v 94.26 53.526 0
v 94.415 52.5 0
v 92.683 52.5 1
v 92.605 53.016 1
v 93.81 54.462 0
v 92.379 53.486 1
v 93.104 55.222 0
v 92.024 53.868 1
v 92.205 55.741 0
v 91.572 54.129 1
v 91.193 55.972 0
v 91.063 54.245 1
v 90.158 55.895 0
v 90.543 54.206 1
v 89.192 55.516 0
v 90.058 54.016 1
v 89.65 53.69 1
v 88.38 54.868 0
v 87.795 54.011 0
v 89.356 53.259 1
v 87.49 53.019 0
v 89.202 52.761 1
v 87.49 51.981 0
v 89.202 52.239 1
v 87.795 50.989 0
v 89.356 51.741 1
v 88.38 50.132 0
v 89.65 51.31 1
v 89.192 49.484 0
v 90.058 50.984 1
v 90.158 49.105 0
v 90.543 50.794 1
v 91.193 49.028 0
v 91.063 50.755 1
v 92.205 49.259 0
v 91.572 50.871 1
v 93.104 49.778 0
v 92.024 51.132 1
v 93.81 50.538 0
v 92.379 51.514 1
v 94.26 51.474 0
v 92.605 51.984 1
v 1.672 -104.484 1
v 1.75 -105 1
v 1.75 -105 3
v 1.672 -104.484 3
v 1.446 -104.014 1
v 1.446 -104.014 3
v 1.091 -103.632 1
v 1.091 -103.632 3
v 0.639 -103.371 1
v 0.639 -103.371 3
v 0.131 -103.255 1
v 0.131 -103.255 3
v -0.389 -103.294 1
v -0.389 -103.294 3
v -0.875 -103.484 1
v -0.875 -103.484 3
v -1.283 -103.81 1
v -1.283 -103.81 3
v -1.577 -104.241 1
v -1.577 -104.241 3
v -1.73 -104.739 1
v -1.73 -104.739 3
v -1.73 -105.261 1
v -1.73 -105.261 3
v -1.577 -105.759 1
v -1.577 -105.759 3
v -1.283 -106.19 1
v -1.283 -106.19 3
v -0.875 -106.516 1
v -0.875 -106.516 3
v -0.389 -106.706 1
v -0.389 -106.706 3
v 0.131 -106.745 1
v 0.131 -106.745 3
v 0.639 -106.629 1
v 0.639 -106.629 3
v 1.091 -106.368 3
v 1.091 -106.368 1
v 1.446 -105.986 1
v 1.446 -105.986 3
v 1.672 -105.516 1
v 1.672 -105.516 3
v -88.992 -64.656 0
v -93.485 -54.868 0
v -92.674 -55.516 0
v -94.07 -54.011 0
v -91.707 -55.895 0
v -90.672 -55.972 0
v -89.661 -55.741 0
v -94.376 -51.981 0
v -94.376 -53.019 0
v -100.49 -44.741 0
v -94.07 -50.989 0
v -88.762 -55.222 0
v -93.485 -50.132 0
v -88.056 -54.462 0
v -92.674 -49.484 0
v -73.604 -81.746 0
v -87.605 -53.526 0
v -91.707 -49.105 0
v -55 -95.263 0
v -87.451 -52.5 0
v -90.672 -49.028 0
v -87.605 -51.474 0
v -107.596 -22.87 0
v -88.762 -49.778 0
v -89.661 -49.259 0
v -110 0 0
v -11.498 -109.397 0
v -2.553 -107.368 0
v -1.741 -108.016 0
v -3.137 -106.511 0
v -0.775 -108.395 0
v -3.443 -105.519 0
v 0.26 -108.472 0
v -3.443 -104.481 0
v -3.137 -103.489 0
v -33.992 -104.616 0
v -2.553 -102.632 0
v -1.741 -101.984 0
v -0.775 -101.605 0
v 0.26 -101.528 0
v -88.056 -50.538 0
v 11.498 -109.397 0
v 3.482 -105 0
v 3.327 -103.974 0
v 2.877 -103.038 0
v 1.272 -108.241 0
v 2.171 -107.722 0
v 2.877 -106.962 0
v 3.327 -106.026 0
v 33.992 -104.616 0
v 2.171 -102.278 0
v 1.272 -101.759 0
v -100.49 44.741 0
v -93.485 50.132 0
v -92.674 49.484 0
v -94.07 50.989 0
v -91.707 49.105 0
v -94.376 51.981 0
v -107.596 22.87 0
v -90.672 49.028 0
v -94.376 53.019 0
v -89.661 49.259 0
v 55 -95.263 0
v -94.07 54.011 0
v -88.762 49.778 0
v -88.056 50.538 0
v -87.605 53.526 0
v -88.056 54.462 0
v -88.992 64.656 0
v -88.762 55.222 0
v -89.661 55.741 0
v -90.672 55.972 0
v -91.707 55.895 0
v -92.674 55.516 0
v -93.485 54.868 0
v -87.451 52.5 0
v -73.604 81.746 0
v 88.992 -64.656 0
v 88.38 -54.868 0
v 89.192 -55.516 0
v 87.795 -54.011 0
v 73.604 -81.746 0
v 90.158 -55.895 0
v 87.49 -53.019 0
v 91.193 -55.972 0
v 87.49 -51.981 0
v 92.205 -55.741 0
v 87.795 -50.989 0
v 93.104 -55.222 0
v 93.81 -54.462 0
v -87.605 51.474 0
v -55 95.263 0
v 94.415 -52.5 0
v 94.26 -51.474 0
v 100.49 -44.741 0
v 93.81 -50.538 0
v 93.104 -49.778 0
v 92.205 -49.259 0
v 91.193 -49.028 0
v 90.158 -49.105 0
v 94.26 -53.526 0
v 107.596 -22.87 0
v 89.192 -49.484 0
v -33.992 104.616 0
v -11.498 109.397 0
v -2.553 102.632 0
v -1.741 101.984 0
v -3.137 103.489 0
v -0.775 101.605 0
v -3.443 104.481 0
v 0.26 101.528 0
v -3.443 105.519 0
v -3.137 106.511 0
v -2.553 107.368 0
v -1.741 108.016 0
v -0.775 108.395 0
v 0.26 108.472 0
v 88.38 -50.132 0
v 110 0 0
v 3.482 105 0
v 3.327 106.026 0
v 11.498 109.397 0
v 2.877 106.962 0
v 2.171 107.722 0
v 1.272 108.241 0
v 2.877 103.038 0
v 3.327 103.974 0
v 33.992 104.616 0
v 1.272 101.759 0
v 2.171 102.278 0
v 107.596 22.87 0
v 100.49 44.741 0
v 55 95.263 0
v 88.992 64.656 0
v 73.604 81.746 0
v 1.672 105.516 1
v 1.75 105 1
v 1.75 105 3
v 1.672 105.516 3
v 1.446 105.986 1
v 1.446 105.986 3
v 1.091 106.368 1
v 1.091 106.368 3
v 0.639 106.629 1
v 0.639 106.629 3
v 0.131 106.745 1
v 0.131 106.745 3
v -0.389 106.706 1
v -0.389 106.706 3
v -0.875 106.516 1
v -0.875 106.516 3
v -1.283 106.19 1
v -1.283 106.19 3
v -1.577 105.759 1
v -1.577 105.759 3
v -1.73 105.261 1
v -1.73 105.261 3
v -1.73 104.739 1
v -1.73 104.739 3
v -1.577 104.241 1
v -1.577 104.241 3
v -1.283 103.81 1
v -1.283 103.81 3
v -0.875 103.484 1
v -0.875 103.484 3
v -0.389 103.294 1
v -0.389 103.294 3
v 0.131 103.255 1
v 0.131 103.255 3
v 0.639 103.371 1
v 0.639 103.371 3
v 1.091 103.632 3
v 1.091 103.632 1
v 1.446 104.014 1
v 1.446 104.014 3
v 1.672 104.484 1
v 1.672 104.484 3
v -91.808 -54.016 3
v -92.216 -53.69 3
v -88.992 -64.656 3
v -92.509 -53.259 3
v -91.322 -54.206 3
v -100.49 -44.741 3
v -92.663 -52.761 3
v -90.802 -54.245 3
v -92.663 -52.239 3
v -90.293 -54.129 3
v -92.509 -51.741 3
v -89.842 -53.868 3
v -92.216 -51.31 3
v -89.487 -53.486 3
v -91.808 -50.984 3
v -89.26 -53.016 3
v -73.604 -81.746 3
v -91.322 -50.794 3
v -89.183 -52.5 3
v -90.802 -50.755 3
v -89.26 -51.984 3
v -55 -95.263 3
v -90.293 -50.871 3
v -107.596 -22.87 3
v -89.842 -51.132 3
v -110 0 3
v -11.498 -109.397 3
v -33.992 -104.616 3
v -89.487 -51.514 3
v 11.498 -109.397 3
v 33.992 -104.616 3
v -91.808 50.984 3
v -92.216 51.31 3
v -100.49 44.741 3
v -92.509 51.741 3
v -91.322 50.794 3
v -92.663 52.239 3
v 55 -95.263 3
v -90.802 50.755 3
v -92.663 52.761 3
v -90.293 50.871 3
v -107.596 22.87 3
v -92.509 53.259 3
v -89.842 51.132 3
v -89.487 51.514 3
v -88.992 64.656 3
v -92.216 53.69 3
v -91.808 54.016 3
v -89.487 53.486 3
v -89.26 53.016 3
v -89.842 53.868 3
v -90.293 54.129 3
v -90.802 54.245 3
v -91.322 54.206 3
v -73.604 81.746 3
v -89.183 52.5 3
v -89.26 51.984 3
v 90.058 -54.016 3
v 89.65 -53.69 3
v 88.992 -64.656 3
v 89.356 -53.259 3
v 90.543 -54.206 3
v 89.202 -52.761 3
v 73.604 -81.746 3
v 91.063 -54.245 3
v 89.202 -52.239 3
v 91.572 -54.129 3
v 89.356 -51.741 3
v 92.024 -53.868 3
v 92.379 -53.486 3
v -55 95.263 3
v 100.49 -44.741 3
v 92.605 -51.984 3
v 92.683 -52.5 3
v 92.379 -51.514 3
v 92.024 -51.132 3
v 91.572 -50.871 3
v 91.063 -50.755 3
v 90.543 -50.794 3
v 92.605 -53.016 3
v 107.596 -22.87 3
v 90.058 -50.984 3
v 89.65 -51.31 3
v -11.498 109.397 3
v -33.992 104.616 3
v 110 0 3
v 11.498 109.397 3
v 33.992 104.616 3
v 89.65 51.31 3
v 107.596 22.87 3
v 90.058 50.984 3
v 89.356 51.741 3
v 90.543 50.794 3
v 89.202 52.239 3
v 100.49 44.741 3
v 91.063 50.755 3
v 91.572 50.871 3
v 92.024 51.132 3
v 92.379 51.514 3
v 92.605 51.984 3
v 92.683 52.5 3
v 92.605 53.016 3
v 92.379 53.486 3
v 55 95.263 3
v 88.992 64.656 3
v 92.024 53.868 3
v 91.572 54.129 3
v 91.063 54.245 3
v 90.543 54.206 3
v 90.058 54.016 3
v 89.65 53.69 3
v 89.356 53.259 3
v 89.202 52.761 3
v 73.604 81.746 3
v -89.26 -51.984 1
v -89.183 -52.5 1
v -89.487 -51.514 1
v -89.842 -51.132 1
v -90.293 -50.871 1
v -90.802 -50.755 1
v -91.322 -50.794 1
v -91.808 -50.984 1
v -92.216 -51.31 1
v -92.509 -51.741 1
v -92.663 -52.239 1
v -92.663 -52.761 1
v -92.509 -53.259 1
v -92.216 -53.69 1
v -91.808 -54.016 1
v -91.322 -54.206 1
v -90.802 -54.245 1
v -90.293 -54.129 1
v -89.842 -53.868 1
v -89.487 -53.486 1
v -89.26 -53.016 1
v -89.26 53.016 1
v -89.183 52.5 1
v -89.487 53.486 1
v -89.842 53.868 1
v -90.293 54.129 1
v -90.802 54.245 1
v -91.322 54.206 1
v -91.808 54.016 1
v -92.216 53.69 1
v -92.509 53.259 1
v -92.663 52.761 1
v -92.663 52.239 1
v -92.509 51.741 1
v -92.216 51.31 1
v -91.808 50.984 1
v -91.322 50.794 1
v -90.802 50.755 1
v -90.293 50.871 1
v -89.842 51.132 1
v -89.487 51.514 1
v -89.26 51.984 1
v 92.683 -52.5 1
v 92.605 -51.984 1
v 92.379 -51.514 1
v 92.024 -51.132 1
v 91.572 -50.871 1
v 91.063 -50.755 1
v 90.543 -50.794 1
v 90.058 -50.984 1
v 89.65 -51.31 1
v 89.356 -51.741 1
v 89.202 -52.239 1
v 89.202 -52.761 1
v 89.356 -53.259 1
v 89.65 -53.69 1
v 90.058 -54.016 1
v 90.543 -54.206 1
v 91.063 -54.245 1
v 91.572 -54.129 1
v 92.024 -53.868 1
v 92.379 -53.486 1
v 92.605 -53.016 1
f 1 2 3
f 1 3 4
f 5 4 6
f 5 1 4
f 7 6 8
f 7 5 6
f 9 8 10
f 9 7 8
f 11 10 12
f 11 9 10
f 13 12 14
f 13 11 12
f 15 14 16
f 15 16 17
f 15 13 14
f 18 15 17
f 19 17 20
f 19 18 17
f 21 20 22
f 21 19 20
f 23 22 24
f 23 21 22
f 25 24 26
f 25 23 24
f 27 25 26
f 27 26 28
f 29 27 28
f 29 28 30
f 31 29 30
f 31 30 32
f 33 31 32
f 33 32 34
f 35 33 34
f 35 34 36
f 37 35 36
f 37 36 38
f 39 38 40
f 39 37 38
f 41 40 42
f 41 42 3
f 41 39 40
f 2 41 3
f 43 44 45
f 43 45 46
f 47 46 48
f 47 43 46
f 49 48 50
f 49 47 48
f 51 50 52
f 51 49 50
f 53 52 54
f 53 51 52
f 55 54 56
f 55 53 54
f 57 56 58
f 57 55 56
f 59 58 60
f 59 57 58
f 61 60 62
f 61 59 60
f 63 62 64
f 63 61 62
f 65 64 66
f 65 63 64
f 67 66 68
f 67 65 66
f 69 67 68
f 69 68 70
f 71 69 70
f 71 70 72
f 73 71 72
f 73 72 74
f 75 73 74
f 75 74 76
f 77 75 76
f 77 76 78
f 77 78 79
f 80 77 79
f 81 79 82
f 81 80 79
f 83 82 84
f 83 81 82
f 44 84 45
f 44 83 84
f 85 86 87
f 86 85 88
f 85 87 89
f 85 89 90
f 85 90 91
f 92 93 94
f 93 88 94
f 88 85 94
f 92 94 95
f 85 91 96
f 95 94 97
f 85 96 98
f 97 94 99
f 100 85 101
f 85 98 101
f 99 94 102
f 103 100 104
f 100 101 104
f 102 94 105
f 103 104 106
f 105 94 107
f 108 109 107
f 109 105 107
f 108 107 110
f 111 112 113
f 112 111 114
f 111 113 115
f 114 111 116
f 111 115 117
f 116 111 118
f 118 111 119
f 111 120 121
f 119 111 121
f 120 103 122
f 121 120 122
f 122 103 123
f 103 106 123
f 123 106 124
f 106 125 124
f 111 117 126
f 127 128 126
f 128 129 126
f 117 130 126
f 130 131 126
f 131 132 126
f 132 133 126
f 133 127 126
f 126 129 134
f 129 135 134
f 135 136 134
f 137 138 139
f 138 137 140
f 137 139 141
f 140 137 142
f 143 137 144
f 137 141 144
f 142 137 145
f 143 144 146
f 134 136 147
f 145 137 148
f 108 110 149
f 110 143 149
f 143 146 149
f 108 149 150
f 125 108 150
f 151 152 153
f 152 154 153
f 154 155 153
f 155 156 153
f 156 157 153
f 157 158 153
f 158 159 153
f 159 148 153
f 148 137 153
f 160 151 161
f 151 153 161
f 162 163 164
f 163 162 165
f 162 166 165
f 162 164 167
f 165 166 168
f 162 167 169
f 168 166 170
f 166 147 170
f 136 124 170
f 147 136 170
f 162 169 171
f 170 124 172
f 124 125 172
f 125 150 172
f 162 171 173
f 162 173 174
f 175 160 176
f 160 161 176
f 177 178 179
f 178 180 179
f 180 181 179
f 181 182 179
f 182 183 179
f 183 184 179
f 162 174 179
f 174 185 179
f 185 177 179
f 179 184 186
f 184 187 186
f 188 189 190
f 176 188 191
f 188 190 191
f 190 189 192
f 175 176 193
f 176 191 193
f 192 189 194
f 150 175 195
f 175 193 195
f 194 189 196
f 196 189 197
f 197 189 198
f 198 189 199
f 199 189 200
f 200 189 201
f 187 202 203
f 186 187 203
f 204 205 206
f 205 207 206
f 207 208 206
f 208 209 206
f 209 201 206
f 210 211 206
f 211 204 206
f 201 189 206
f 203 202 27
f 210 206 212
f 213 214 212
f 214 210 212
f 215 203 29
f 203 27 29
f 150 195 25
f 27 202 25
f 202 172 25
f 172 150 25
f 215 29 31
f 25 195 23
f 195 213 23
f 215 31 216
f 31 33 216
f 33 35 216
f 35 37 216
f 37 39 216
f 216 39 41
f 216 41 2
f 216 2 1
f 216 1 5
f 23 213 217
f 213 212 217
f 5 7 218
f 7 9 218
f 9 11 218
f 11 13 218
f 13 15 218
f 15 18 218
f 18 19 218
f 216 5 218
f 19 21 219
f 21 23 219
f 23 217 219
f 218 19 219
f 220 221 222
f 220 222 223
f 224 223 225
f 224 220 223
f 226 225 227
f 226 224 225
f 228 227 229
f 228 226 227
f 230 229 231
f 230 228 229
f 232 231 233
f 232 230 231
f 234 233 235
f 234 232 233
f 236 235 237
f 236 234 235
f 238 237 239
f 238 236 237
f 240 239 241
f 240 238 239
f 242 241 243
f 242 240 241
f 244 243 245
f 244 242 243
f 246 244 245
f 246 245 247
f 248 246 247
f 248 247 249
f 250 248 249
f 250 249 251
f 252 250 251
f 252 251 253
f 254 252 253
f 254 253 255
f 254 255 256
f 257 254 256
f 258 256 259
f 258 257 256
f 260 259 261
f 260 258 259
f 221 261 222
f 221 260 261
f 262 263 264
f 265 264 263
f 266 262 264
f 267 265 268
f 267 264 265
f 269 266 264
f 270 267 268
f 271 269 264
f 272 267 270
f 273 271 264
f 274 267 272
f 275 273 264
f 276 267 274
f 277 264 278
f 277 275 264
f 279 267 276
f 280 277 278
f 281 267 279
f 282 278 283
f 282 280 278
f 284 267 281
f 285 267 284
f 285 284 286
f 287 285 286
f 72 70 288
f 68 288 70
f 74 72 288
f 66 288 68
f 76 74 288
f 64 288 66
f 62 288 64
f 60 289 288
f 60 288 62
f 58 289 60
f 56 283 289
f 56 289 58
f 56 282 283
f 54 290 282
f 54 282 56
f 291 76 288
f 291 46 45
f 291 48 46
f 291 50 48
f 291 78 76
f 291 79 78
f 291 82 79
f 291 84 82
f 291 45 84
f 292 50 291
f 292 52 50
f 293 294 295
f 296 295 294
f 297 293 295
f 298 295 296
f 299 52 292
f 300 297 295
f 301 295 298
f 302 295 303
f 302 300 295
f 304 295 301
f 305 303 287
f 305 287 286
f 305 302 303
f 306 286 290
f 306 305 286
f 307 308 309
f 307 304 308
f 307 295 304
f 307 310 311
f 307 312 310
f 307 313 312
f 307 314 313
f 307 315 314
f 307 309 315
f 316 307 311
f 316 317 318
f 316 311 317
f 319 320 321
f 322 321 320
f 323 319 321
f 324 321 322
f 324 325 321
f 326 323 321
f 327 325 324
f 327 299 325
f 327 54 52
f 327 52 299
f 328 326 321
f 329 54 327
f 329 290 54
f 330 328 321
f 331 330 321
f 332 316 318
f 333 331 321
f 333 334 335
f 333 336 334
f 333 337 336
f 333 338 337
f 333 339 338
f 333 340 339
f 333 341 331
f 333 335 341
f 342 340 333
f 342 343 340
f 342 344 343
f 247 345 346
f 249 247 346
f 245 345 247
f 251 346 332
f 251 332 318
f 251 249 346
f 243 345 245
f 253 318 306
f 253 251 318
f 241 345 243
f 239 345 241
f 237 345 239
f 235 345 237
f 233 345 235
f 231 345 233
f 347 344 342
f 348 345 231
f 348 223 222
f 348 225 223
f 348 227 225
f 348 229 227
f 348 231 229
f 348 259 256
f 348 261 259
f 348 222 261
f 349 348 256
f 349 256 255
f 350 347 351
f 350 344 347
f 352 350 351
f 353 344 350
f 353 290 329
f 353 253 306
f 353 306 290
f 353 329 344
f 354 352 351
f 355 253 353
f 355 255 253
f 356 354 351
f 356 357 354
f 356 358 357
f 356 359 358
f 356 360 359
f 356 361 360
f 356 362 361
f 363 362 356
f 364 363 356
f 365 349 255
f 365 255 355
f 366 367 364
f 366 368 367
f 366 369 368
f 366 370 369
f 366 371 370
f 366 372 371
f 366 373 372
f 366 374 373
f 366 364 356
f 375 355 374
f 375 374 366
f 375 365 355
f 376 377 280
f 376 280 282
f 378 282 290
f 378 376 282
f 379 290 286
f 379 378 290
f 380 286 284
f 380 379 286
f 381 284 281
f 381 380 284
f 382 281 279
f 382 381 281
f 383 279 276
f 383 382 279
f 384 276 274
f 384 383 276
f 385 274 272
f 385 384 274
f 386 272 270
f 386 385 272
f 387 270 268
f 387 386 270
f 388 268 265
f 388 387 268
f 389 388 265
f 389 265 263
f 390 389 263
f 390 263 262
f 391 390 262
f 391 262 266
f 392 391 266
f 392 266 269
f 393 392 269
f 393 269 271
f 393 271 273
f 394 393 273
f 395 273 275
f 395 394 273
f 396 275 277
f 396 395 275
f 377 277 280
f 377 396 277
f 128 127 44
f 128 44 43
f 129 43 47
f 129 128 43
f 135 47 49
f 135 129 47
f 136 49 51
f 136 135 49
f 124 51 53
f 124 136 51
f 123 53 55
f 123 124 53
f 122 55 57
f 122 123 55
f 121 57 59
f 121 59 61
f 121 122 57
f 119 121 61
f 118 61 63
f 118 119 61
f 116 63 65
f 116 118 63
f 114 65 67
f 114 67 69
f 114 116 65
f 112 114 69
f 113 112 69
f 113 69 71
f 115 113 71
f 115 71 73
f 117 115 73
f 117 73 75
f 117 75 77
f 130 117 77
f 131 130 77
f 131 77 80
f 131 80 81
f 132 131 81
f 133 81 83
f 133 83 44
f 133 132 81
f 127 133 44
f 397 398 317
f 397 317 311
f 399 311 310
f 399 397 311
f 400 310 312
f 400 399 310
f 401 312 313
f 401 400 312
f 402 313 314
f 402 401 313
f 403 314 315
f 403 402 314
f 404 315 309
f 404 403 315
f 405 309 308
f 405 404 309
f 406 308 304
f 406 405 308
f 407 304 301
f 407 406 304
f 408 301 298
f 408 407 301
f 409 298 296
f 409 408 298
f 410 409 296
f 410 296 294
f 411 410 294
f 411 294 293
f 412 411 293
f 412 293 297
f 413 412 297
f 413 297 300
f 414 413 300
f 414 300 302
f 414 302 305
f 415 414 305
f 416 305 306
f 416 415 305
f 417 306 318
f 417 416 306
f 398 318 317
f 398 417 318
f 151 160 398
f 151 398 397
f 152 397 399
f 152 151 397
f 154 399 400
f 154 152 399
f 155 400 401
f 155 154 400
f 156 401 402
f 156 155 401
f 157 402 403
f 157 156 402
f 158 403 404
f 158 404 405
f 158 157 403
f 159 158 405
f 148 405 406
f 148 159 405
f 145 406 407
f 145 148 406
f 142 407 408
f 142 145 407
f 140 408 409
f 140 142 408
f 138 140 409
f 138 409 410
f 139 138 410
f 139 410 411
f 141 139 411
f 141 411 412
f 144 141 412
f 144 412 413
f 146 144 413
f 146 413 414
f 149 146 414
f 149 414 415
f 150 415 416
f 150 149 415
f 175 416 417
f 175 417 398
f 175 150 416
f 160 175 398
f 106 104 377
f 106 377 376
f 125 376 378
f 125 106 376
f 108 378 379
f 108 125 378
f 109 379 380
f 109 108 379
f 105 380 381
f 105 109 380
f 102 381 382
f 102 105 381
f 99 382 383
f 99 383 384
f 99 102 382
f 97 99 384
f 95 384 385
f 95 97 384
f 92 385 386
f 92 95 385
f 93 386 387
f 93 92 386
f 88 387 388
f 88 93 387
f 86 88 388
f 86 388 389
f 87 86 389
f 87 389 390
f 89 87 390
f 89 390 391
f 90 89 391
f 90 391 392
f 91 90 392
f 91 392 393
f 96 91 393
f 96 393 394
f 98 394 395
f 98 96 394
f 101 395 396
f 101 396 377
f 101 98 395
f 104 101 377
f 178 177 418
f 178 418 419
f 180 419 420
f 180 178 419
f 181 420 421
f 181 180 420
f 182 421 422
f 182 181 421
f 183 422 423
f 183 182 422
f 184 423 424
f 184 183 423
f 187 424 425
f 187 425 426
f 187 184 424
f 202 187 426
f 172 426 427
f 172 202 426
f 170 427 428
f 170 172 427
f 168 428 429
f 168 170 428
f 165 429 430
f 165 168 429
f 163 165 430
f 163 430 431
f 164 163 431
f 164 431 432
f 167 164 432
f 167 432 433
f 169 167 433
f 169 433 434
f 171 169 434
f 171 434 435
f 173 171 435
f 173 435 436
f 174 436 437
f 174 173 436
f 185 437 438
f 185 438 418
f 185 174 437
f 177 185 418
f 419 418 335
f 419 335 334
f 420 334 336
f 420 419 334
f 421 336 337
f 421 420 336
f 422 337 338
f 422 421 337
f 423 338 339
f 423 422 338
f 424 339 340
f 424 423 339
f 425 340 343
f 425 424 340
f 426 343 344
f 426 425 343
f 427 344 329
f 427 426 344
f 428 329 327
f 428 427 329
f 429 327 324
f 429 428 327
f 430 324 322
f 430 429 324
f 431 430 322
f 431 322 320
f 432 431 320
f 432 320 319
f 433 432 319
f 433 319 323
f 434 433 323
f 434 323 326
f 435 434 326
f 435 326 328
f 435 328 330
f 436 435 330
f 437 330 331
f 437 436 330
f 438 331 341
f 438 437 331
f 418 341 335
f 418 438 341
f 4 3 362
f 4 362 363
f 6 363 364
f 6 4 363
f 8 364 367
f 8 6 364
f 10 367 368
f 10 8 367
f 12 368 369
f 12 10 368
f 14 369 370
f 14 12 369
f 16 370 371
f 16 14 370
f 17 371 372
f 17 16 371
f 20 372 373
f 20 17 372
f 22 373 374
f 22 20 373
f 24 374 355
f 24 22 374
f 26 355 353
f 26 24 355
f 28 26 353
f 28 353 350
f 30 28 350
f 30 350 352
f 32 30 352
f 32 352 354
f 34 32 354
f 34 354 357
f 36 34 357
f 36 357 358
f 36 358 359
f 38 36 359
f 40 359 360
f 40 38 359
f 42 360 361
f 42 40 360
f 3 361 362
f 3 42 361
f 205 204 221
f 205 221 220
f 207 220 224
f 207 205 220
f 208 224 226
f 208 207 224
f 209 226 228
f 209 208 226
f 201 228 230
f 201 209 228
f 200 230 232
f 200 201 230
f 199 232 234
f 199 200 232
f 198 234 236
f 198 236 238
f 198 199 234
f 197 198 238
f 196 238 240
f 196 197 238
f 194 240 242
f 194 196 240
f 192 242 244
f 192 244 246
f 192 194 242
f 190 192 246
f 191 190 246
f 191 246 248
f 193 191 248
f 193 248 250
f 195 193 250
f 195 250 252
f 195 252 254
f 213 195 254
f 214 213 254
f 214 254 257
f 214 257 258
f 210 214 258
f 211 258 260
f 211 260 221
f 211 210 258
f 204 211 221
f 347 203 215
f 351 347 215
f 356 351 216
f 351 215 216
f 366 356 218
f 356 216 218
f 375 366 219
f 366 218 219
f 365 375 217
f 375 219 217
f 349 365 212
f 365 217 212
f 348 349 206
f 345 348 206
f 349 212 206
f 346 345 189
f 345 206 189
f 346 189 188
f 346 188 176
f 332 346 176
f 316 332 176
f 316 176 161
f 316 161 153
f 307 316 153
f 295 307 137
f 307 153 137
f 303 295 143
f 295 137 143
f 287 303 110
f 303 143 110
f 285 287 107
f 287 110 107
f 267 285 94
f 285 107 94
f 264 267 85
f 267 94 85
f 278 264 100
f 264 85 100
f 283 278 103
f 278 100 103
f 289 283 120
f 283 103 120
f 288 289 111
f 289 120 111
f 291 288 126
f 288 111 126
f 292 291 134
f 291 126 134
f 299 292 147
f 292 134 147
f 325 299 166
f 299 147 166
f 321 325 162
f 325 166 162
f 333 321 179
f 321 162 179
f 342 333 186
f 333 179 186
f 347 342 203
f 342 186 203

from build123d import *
from OCP.BRepFilletAPI import BRepFilletAPI_MakeChamfer

# Parameters (mm, degrees)
CROQUIS1_R              = 110
CROQUIS1_R_2            = 1.75
SALIENTE_EXTRUIR1_DEPTH = 3
CHAFL_N1_SIZE           = 1
CHAFL_N1_SIZE2          = 1.732050808
CHAFL_N2_SIZE           = 1
CHAFL_N2_SIZE2          = 1.732050808


with BuildPart() as part:
    # Croquis1 → Saliente-Extruir1 (new body)
    with BuildSketch(Plane.XY):
        Circle(CROQUIS1_R)
        with Locations((0, 105)):
            Circle(CROQUIS1_R_2, mode=Mode.SUBTRACT)
        with Locations((90.932667397, 52.5)):
            Circle(CROQUIS1_R_2, mode=Mode.SUBTRACT)
        with Locations((90.932667397, -52.5)):
            Circle(CROQUIS1_R_2, mode=Mode.SUBTRACT)
        with Locations((0, -105)):
            Circle(CROQUIS1_R_2, mode=Mode.SUBTRACT)
        with Locations((-90.932667397, -52.5)):
            Circle(CROQUIS1_R_2, mode=Mode.SUBTRACT)
        with Locations((-90.932667397, 52.5)):
            Circle(CROQUIS1_R_2, mode=Mode.SUBTRACT)
    extrude(amount=SALIENTE_EXTRUIR1_DEPTH)

    # Chaflán1
    chafl_n1_edges = [part.edges().sort_by_distance(p)[0] for p in [
        (-1.75, 105, 0),
    ]]
    chafl_n1_side = [part.faces().sort_by_distance(p)[0] for p in [
        (-1.75, 105, 1.5),
    ]]
    chamfer(chafl_n1_edges, length=CHAFL_N1_SIZE, length2=CHAFL_N1_SIZE2, reference=chafl_n1_side[0])

    # Chaflán2: one chamfer whose edges measure the first distance from different faces: ONE call of the kernel's chamfer builder (chamfer() names one face for all edges)
    chafl_n2_edges_1 = [part.edges().sort_by_distance(p)[0] for p in [
        (89.182667397, -52.5, 0),
    ]]
    chafl_n2_side_1 = [part.faces().sort_by_distance(p)[0] for p in [
        (89.182667397, -52.5, 1.5),
    ]]
    chafl_n2_edges_2 = [part.edges().sort_by_distance(p)[0] for p in [
        (-1.75, -105, 0),
    ]]
    chafl_n2_side_2 = [part.faces().sort_by_distance(p)[0] for p in [
        (-1.75, -105, 1.5),
    ]]
    chafl_n2_edges_3 = [part.edges().sort_by_distance(p)[0] for p in [
        (-92.682667397, -52.5, 0),
    ]]
    chafl_n2_side_3 = [part.faces().sort_by_distance(p)[0] for p in [
        (-92.682667397, -52.5, 1.5),
    ]]
    chafl_n2_edges_4 = [part.edges().sort_by_distance(p)[0] for p in [
        (-92.682667397, 52.5, 0),
    ]]
    chafl_n2_side_4 = [part.faces().sort_by_distance(p)[0] for p in [
        (-92.682667397, 52.5, 1.5),
    ]]
    chafl_n2_edges_5 = [part.edges().sort_by_distance(p)[0] for p in [
        (89.182667397, 52.5, 0),
    ]]
    chafl_n2_side_5 = [part.faces().sort_by_distance(p)[0] for p in [
        (89.182667397, 52.5, 1.5),
    ]]
    chafl_n2 = BRepFilletAPI_MakeChamfer(part.part.solid().wrapped)
    for e in chafl_n2_edges_1:
        chafl_n2.Add(CHAFL_N2_SIZE, CHAFL_N2_SIZE2, e.wrapped, chafl_n2_side_1[0].wrapped)  # the first distance lies on this face
    for e in chafl_n2_edges_2:
        chafl_n2.Add(CHAFL_N2_SIZE, CHAFL_N2_SIZE2, e.wrapped, chafl_n2_side_2[0].wrapped)  # the first distance lies on this face
    for e in chafl_n2_edges_3:
        chafl_n2.Add(CHAFL_N2_SIZE, CHAFL_N2_SIZE2, e.wrapped, chafl_n2_side_3[0].wrapped)  # the first distance lies on this face
    for e in chafl_n2_edges_4:
        chafl_n2.Add(CHAFL_N2_SIZE, CHAFL_N2_SIZE2, e.wrapped, chafl_n2_side_4[0].wrapped)  # the first distance lies on this face
    for e in chafl_n2_edges_5:
        chafl_n2.Add(CHAFL_N2_SIZE, CHAFL_N2_SIZE2, e.wrapped, chafl_n2_side_5[0].wrapped)  # the first distance lies on this face
    add(Compound.cast(chafl_n2.Shape()), mode=Mode.REPLACE)


solid = part.part
